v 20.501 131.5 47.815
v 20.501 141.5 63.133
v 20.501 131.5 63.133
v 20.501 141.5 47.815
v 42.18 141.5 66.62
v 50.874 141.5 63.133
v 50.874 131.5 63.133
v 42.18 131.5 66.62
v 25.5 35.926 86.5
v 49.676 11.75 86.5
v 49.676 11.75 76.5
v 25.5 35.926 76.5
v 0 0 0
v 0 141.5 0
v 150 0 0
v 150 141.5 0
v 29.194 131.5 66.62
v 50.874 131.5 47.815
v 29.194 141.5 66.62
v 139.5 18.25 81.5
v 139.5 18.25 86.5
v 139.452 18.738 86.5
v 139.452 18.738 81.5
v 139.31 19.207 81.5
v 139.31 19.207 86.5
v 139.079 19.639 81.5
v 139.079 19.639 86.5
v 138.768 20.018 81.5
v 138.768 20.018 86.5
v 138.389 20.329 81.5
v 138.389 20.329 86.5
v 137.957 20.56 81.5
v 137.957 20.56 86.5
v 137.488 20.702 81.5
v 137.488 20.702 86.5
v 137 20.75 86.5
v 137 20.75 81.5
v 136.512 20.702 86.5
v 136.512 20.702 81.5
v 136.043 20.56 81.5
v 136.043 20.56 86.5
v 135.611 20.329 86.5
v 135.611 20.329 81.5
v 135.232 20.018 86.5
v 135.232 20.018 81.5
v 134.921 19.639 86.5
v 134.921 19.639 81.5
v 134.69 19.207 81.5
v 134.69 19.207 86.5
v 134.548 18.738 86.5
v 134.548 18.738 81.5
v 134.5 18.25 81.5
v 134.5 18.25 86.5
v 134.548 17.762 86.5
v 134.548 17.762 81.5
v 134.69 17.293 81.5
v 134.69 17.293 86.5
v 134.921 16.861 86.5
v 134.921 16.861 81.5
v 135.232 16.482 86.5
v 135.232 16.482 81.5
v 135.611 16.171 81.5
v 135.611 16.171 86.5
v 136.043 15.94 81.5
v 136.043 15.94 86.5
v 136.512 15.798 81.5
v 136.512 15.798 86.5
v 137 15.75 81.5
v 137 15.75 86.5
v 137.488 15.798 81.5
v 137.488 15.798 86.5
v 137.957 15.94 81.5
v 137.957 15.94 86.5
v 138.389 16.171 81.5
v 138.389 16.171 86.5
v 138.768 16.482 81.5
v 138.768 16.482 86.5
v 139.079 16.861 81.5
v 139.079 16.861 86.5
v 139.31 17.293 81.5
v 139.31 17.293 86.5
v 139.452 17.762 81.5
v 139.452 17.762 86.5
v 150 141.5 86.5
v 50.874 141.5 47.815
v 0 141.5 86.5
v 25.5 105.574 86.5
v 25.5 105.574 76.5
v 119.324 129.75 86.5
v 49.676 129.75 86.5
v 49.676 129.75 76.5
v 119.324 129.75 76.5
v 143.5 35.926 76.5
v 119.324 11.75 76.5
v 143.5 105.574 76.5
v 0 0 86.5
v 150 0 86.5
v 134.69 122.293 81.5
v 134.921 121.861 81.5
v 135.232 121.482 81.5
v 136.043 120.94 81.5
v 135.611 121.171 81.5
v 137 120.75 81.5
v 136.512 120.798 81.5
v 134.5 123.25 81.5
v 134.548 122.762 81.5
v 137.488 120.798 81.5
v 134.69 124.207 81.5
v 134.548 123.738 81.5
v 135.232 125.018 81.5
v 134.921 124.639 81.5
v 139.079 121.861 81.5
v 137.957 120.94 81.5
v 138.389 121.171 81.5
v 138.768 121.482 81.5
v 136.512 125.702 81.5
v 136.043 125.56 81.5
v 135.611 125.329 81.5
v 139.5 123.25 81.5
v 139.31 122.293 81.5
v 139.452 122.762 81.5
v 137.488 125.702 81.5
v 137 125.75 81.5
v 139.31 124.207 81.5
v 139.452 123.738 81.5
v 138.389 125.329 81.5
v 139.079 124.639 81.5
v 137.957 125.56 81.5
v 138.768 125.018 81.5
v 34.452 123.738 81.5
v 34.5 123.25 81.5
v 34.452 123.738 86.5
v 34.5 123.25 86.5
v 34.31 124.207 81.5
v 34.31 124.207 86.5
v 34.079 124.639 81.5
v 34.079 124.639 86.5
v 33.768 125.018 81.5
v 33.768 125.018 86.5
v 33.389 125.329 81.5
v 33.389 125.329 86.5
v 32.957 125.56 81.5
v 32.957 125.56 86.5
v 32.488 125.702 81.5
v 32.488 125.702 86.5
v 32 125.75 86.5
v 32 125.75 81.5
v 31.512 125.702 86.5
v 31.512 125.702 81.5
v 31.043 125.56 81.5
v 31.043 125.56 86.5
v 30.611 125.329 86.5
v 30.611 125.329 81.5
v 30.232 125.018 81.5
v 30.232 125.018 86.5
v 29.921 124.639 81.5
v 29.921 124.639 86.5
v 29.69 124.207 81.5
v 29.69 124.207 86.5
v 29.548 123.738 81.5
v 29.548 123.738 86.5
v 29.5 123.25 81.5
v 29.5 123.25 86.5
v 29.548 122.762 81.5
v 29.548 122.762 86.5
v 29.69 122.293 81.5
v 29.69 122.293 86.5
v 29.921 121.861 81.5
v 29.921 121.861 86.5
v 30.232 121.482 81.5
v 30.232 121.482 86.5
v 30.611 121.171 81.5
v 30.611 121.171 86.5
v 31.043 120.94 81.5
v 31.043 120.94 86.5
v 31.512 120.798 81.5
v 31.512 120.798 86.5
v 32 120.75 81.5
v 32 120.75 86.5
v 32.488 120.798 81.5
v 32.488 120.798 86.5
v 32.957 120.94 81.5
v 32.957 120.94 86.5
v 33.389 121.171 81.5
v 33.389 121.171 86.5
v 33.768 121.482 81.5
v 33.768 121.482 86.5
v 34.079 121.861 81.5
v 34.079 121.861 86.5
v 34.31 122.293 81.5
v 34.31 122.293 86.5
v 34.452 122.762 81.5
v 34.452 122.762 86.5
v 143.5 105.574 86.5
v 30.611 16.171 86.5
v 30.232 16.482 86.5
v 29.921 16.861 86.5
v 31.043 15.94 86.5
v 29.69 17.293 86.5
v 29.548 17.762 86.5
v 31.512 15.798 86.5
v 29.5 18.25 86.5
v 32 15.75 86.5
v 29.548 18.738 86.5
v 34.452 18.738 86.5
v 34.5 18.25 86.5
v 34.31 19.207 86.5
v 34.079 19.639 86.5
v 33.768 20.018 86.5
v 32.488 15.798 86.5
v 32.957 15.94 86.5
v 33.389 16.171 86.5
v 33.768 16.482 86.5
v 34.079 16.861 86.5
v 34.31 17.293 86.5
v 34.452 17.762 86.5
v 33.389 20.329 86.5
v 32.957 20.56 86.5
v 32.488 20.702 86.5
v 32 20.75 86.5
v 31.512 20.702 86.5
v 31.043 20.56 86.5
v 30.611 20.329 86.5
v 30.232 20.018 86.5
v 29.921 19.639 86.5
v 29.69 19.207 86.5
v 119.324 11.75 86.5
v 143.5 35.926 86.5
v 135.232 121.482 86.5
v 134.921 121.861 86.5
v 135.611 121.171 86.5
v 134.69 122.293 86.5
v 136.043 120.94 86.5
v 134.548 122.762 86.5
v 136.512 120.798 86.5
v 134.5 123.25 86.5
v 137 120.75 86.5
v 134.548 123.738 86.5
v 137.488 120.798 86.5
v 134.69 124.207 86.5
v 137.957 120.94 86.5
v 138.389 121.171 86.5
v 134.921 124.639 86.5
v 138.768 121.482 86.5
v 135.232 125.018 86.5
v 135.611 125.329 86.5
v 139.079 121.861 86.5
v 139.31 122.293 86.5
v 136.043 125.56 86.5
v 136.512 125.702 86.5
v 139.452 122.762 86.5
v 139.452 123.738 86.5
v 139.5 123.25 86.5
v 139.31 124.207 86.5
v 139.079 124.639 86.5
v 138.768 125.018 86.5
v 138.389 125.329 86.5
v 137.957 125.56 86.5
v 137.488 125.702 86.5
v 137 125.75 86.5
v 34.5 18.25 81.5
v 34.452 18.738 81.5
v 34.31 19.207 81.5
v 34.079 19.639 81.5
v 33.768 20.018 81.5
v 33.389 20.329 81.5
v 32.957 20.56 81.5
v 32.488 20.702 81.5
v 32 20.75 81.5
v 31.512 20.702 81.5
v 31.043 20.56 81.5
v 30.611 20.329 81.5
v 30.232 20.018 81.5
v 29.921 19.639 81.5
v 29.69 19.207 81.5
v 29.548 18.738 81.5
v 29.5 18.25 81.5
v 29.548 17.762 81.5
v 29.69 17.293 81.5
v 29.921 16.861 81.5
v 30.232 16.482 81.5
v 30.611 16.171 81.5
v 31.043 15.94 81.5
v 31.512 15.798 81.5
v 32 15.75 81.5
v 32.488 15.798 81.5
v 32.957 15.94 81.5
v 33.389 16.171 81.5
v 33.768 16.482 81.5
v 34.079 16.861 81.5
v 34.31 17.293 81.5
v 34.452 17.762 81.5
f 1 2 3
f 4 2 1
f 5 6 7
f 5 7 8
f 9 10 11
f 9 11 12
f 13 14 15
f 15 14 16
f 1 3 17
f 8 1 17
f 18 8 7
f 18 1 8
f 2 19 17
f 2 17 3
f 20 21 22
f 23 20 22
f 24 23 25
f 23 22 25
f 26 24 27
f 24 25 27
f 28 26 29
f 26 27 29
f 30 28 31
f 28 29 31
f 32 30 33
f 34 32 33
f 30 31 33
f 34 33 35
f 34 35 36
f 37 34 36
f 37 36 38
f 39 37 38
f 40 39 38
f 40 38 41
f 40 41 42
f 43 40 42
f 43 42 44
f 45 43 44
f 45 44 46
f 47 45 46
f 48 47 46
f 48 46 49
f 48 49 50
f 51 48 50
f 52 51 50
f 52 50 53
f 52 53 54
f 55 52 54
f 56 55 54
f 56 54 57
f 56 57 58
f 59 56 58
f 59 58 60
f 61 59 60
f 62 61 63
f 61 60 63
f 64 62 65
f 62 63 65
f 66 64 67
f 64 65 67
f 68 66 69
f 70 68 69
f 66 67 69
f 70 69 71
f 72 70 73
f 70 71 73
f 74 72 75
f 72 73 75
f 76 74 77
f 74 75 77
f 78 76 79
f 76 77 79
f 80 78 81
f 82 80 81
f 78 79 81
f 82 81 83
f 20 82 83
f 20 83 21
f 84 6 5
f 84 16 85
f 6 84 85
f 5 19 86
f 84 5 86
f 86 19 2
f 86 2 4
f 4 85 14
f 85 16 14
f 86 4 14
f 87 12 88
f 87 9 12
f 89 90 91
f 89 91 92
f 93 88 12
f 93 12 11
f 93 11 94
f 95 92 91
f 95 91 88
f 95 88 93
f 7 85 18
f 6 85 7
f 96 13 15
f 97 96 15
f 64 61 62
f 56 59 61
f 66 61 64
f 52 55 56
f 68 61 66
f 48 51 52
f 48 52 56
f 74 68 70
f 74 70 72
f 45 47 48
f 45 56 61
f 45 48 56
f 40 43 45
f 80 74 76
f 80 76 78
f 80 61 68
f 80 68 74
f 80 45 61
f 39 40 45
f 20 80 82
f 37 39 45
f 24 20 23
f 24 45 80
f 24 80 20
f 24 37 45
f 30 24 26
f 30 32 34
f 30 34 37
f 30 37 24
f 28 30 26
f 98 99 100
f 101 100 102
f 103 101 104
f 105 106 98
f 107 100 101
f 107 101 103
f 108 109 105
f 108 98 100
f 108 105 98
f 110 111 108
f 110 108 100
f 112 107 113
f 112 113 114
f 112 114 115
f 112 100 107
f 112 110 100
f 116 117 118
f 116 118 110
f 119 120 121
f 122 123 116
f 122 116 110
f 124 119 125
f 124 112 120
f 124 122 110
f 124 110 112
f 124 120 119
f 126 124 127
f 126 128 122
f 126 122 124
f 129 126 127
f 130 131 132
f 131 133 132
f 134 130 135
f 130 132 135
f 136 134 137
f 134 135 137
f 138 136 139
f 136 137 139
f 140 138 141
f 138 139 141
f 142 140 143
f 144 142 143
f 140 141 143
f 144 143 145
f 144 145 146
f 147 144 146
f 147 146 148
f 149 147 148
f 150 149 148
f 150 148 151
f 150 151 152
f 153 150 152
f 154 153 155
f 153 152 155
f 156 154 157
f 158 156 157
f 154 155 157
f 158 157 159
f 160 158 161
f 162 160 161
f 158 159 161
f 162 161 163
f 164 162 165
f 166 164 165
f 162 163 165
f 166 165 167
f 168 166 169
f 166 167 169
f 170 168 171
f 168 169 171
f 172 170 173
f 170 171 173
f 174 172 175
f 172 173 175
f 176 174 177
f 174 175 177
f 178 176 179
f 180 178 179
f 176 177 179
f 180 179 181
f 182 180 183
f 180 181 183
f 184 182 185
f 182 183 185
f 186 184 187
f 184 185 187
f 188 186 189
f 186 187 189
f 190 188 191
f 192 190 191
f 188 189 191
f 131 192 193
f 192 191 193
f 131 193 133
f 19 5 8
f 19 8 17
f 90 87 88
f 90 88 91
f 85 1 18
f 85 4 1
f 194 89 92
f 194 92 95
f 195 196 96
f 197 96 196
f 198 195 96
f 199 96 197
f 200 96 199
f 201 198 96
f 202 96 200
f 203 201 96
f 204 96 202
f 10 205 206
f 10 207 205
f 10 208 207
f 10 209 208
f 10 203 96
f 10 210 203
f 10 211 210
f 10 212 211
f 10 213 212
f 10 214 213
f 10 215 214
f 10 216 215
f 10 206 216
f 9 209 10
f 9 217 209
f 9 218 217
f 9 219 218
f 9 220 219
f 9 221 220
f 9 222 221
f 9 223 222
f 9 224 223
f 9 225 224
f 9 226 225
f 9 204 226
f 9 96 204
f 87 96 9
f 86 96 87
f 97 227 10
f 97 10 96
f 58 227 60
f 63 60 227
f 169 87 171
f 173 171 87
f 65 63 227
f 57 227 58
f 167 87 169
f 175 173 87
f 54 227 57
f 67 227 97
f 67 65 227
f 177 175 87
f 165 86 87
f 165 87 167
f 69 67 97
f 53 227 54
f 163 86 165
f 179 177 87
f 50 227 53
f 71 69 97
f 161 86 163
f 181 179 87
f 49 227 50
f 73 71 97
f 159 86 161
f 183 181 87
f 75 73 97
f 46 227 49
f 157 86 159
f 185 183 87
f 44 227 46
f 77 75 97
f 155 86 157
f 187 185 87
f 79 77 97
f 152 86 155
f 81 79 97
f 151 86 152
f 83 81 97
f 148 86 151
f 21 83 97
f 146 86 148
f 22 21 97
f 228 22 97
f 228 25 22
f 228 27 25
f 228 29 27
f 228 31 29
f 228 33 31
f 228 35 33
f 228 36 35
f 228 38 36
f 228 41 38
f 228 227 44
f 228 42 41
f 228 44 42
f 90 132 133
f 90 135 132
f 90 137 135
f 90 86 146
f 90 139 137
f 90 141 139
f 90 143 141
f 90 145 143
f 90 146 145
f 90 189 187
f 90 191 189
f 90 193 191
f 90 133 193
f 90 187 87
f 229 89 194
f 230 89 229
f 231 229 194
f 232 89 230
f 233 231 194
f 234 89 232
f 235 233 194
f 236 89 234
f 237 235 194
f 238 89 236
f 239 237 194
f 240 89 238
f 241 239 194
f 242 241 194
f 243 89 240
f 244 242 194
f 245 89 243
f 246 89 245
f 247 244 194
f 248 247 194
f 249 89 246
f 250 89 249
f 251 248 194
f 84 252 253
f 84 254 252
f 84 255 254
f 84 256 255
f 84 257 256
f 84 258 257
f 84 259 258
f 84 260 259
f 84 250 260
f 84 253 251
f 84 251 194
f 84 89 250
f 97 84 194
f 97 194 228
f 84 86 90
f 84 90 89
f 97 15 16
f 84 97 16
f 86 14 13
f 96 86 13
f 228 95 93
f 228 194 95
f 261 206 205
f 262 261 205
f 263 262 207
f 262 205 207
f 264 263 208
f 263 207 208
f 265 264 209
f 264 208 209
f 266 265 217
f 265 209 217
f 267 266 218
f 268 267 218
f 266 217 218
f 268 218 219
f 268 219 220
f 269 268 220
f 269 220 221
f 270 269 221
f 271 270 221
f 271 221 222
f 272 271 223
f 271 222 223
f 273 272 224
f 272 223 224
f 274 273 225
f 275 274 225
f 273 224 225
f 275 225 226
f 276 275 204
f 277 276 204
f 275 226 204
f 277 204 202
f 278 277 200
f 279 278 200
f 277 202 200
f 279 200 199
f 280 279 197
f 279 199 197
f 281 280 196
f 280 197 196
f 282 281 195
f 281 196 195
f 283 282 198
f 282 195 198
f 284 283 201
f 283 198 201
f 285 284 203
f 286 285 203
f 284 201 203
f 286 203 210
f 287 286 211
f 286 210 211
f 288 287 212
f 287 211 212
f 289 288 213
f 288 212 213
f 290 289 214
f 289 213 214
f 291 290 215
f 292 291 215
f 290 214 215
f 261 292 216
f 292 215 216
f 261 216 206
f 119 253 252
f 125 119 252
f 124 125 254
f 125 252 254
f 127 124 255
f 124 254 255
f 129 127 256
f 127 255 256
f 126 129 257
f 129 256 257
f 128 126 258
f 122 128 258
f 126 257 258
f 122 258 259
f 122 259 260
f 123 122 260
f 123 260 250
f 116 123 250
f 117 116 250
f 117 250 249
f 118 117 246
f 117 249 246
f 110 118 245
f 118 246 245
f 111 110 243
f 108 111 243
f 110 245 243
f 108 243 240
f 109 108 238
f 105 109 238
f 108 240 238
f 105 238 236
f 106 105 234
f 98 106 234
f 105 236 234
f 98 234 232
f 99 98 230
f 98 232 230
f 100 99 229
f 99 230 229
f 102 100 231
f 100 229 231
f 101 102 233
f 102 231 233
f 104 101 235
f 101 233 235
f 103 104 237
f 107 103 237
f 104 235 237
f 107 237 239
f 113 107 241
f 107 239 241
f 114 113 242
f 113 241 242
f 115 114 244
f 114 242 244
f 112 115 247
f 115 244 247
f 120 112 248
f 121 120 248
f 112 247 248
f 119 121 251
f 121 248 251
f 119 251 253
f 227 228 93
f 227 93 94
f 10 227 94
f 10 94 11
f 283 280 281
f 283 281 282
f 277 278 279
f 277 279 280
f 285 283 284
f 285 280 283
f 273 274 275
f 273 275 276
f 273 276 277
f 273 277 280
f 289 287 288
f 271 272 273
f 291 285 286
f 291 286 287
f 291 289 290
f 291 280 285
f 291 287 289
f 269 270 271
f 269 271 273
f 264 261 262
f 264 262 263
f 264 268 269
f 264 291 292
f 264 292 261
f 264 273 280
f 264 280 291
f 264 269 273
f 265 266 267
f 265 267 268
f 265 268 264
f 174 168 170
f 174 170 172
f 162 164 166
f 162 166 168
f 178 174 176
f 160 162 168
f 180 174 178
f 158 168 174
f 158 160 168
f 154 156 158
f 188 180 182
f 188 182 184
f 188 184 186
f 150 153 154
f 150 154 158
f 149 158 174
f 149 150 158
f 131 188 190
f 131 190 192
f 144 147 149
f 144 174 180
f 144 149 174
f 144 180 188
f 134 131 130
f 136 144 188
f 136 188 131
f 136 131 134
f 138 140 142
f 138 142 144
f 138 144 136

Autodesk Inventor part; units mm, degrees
ref_plane "YZ Plane" through (0, 0, 0) normal (1, 0, 0) x (0, 1, 0)
ref_plane "XZ Plane" through (0, 0, 0) normal (0, 1, 0) x (-1, 0, 0)
ref_plane "XY Plane" through (0, 0, 0) normal (0, 0, 1) x (1, 0, 0)
sketch "스케치1" plane through (0, 0, 0) normal (0, 0, 1) x (1, 0, 0)
  line L0 (0, 0) -> (150, 0)
  line L1 (150, 0) -> (150, 141.5)
  line L2 (150, 141.5) -> (0, 141.5)
  line L3 (0, 141.5) -> (0, 0)
  dimension "d0" = 150
  dimension "d1" = 141.5
extrude "돌출1" add sketch "스케치1" along normal blind 86.5
sketch "스케치2" plane through (0, 0, 86.5) normal (0, 0, 1) x (1, 0, 0)
  line L0 (150, 0) -> (150, 141.5) projected
  line L1 (137, 18.25) -> (32, 18.25) construction
  line L2 (32, 18.25) -> (32, 123.25) construction
  line L3 (32, 123.25) -> (137, 123.25) construction
  line L4 (137, 123.25) -> (137, 18.25) construction
  line L5 (137, 18.25) -> (32, 123.25) construction
  line L6 (32, 18.25) -> (137, 123.25) construction
  circle A0 centre (32, 123.25) radius 2.5
  circle A1 centre (32, 18.25) radius 2.5
  circle A2 centre (137, 18.25) radius 2.5
  circle A3 centre (137, 123.25) radius 2.5
  point P0 (84.5, 70.75)
  point P1 (32, 70.75)
  point P2 (0, 70.75)
  dimension "d4" = 105
  dimension "d5" = 105
  dimension "d7" = 13
  dimension "d9" = 5
  dimension "d12" = 360
extrude "돌출2" cut sketch "스케치2" against normal blind 5
sketch "스케치3" plane through (0, 0, 86.5) normal (0, 0, 1) x (1, 0, 0)
  circle A0 centre (32, 123.25) radius 2.5 construction
  circle A1 centre (137, 18.25) radius 2.5 construction
  line L0 (32, 123.25) -> (137, 123.25) construction
  line L1 (137, 123.25) -> (137, 18.25) construction
  line L2 (137, 18.25) -> (32, 18.25) construction
  line L3 (32, 18.25) -> (32, 123.25) construction
  line L4 (84.5, 123.25) -> (84.5, 70.75) construction
  line L5 (84.5, 70.75) -> (137, 70.75) construction
  line L6 (119.3236, 11.75) -> (49.6764, 11.75)
  line L7 (25.5, 35.9264) -> (25.5, 105.5736)
  line L8 (49.6764, 129.75) -> (119.3236, 129.75)
  line L9 (143.5, 105.5736) -> (143.5, 35.9264)
  line L10 (143.5, 11.75) -> (25.5, 129.75) construction
  line L11 (25.5, 11.75) -> (143.5, 129.75) construction
  line L12 (119.3236, 129.75) -> (143.5, 105.5736)
  line L13 (25.5, 105.5736) -> (49.6764, 129.75)
  line L14 (49.6764, 11.75) -> (25.5, 35.9264)
  line L15 (143.5, 35.9264) -> (119.3236, 11.75)
  point P0 (150, 141.5)
  dimension "d28" = 360
  dimension "d16" = 90
  dimension "d21" = 118
  dimension "d22" = 45
  dimension "d24" = 45
  dimension "d25" = 30
extrude "돌출3" cut sketch "스케치3" against normal blind 10
sketch "스케치4" plane through (0, 141.5, 0) normal (0, 1, 0) x (1, 0, 0)
  line L0 (20.5008, -63.1326) -> (20.5008, -47.8147)
  line L1 (20.5008, -47.8147) -> (50.8737, -47.8147)
  line L2 (50.8737, -47.8147) -> (50.8737, -63.1326)
  line L3 (50.8737, -63.1326) -> (42.1805, -66.6205)
  line L4 (42.1805, -66.6205) -> (29.194, -66.6205)
  line L5 (29.194, -66.6205) -> (20.5008, -63.1326)
  point P0 (35.6872, -66.6205)
  point P1 (35.6872, -47.8147)
extrude "돌출4" cut sketch "스케치4" against normal blind 10
properties part number "파워서플라이"
